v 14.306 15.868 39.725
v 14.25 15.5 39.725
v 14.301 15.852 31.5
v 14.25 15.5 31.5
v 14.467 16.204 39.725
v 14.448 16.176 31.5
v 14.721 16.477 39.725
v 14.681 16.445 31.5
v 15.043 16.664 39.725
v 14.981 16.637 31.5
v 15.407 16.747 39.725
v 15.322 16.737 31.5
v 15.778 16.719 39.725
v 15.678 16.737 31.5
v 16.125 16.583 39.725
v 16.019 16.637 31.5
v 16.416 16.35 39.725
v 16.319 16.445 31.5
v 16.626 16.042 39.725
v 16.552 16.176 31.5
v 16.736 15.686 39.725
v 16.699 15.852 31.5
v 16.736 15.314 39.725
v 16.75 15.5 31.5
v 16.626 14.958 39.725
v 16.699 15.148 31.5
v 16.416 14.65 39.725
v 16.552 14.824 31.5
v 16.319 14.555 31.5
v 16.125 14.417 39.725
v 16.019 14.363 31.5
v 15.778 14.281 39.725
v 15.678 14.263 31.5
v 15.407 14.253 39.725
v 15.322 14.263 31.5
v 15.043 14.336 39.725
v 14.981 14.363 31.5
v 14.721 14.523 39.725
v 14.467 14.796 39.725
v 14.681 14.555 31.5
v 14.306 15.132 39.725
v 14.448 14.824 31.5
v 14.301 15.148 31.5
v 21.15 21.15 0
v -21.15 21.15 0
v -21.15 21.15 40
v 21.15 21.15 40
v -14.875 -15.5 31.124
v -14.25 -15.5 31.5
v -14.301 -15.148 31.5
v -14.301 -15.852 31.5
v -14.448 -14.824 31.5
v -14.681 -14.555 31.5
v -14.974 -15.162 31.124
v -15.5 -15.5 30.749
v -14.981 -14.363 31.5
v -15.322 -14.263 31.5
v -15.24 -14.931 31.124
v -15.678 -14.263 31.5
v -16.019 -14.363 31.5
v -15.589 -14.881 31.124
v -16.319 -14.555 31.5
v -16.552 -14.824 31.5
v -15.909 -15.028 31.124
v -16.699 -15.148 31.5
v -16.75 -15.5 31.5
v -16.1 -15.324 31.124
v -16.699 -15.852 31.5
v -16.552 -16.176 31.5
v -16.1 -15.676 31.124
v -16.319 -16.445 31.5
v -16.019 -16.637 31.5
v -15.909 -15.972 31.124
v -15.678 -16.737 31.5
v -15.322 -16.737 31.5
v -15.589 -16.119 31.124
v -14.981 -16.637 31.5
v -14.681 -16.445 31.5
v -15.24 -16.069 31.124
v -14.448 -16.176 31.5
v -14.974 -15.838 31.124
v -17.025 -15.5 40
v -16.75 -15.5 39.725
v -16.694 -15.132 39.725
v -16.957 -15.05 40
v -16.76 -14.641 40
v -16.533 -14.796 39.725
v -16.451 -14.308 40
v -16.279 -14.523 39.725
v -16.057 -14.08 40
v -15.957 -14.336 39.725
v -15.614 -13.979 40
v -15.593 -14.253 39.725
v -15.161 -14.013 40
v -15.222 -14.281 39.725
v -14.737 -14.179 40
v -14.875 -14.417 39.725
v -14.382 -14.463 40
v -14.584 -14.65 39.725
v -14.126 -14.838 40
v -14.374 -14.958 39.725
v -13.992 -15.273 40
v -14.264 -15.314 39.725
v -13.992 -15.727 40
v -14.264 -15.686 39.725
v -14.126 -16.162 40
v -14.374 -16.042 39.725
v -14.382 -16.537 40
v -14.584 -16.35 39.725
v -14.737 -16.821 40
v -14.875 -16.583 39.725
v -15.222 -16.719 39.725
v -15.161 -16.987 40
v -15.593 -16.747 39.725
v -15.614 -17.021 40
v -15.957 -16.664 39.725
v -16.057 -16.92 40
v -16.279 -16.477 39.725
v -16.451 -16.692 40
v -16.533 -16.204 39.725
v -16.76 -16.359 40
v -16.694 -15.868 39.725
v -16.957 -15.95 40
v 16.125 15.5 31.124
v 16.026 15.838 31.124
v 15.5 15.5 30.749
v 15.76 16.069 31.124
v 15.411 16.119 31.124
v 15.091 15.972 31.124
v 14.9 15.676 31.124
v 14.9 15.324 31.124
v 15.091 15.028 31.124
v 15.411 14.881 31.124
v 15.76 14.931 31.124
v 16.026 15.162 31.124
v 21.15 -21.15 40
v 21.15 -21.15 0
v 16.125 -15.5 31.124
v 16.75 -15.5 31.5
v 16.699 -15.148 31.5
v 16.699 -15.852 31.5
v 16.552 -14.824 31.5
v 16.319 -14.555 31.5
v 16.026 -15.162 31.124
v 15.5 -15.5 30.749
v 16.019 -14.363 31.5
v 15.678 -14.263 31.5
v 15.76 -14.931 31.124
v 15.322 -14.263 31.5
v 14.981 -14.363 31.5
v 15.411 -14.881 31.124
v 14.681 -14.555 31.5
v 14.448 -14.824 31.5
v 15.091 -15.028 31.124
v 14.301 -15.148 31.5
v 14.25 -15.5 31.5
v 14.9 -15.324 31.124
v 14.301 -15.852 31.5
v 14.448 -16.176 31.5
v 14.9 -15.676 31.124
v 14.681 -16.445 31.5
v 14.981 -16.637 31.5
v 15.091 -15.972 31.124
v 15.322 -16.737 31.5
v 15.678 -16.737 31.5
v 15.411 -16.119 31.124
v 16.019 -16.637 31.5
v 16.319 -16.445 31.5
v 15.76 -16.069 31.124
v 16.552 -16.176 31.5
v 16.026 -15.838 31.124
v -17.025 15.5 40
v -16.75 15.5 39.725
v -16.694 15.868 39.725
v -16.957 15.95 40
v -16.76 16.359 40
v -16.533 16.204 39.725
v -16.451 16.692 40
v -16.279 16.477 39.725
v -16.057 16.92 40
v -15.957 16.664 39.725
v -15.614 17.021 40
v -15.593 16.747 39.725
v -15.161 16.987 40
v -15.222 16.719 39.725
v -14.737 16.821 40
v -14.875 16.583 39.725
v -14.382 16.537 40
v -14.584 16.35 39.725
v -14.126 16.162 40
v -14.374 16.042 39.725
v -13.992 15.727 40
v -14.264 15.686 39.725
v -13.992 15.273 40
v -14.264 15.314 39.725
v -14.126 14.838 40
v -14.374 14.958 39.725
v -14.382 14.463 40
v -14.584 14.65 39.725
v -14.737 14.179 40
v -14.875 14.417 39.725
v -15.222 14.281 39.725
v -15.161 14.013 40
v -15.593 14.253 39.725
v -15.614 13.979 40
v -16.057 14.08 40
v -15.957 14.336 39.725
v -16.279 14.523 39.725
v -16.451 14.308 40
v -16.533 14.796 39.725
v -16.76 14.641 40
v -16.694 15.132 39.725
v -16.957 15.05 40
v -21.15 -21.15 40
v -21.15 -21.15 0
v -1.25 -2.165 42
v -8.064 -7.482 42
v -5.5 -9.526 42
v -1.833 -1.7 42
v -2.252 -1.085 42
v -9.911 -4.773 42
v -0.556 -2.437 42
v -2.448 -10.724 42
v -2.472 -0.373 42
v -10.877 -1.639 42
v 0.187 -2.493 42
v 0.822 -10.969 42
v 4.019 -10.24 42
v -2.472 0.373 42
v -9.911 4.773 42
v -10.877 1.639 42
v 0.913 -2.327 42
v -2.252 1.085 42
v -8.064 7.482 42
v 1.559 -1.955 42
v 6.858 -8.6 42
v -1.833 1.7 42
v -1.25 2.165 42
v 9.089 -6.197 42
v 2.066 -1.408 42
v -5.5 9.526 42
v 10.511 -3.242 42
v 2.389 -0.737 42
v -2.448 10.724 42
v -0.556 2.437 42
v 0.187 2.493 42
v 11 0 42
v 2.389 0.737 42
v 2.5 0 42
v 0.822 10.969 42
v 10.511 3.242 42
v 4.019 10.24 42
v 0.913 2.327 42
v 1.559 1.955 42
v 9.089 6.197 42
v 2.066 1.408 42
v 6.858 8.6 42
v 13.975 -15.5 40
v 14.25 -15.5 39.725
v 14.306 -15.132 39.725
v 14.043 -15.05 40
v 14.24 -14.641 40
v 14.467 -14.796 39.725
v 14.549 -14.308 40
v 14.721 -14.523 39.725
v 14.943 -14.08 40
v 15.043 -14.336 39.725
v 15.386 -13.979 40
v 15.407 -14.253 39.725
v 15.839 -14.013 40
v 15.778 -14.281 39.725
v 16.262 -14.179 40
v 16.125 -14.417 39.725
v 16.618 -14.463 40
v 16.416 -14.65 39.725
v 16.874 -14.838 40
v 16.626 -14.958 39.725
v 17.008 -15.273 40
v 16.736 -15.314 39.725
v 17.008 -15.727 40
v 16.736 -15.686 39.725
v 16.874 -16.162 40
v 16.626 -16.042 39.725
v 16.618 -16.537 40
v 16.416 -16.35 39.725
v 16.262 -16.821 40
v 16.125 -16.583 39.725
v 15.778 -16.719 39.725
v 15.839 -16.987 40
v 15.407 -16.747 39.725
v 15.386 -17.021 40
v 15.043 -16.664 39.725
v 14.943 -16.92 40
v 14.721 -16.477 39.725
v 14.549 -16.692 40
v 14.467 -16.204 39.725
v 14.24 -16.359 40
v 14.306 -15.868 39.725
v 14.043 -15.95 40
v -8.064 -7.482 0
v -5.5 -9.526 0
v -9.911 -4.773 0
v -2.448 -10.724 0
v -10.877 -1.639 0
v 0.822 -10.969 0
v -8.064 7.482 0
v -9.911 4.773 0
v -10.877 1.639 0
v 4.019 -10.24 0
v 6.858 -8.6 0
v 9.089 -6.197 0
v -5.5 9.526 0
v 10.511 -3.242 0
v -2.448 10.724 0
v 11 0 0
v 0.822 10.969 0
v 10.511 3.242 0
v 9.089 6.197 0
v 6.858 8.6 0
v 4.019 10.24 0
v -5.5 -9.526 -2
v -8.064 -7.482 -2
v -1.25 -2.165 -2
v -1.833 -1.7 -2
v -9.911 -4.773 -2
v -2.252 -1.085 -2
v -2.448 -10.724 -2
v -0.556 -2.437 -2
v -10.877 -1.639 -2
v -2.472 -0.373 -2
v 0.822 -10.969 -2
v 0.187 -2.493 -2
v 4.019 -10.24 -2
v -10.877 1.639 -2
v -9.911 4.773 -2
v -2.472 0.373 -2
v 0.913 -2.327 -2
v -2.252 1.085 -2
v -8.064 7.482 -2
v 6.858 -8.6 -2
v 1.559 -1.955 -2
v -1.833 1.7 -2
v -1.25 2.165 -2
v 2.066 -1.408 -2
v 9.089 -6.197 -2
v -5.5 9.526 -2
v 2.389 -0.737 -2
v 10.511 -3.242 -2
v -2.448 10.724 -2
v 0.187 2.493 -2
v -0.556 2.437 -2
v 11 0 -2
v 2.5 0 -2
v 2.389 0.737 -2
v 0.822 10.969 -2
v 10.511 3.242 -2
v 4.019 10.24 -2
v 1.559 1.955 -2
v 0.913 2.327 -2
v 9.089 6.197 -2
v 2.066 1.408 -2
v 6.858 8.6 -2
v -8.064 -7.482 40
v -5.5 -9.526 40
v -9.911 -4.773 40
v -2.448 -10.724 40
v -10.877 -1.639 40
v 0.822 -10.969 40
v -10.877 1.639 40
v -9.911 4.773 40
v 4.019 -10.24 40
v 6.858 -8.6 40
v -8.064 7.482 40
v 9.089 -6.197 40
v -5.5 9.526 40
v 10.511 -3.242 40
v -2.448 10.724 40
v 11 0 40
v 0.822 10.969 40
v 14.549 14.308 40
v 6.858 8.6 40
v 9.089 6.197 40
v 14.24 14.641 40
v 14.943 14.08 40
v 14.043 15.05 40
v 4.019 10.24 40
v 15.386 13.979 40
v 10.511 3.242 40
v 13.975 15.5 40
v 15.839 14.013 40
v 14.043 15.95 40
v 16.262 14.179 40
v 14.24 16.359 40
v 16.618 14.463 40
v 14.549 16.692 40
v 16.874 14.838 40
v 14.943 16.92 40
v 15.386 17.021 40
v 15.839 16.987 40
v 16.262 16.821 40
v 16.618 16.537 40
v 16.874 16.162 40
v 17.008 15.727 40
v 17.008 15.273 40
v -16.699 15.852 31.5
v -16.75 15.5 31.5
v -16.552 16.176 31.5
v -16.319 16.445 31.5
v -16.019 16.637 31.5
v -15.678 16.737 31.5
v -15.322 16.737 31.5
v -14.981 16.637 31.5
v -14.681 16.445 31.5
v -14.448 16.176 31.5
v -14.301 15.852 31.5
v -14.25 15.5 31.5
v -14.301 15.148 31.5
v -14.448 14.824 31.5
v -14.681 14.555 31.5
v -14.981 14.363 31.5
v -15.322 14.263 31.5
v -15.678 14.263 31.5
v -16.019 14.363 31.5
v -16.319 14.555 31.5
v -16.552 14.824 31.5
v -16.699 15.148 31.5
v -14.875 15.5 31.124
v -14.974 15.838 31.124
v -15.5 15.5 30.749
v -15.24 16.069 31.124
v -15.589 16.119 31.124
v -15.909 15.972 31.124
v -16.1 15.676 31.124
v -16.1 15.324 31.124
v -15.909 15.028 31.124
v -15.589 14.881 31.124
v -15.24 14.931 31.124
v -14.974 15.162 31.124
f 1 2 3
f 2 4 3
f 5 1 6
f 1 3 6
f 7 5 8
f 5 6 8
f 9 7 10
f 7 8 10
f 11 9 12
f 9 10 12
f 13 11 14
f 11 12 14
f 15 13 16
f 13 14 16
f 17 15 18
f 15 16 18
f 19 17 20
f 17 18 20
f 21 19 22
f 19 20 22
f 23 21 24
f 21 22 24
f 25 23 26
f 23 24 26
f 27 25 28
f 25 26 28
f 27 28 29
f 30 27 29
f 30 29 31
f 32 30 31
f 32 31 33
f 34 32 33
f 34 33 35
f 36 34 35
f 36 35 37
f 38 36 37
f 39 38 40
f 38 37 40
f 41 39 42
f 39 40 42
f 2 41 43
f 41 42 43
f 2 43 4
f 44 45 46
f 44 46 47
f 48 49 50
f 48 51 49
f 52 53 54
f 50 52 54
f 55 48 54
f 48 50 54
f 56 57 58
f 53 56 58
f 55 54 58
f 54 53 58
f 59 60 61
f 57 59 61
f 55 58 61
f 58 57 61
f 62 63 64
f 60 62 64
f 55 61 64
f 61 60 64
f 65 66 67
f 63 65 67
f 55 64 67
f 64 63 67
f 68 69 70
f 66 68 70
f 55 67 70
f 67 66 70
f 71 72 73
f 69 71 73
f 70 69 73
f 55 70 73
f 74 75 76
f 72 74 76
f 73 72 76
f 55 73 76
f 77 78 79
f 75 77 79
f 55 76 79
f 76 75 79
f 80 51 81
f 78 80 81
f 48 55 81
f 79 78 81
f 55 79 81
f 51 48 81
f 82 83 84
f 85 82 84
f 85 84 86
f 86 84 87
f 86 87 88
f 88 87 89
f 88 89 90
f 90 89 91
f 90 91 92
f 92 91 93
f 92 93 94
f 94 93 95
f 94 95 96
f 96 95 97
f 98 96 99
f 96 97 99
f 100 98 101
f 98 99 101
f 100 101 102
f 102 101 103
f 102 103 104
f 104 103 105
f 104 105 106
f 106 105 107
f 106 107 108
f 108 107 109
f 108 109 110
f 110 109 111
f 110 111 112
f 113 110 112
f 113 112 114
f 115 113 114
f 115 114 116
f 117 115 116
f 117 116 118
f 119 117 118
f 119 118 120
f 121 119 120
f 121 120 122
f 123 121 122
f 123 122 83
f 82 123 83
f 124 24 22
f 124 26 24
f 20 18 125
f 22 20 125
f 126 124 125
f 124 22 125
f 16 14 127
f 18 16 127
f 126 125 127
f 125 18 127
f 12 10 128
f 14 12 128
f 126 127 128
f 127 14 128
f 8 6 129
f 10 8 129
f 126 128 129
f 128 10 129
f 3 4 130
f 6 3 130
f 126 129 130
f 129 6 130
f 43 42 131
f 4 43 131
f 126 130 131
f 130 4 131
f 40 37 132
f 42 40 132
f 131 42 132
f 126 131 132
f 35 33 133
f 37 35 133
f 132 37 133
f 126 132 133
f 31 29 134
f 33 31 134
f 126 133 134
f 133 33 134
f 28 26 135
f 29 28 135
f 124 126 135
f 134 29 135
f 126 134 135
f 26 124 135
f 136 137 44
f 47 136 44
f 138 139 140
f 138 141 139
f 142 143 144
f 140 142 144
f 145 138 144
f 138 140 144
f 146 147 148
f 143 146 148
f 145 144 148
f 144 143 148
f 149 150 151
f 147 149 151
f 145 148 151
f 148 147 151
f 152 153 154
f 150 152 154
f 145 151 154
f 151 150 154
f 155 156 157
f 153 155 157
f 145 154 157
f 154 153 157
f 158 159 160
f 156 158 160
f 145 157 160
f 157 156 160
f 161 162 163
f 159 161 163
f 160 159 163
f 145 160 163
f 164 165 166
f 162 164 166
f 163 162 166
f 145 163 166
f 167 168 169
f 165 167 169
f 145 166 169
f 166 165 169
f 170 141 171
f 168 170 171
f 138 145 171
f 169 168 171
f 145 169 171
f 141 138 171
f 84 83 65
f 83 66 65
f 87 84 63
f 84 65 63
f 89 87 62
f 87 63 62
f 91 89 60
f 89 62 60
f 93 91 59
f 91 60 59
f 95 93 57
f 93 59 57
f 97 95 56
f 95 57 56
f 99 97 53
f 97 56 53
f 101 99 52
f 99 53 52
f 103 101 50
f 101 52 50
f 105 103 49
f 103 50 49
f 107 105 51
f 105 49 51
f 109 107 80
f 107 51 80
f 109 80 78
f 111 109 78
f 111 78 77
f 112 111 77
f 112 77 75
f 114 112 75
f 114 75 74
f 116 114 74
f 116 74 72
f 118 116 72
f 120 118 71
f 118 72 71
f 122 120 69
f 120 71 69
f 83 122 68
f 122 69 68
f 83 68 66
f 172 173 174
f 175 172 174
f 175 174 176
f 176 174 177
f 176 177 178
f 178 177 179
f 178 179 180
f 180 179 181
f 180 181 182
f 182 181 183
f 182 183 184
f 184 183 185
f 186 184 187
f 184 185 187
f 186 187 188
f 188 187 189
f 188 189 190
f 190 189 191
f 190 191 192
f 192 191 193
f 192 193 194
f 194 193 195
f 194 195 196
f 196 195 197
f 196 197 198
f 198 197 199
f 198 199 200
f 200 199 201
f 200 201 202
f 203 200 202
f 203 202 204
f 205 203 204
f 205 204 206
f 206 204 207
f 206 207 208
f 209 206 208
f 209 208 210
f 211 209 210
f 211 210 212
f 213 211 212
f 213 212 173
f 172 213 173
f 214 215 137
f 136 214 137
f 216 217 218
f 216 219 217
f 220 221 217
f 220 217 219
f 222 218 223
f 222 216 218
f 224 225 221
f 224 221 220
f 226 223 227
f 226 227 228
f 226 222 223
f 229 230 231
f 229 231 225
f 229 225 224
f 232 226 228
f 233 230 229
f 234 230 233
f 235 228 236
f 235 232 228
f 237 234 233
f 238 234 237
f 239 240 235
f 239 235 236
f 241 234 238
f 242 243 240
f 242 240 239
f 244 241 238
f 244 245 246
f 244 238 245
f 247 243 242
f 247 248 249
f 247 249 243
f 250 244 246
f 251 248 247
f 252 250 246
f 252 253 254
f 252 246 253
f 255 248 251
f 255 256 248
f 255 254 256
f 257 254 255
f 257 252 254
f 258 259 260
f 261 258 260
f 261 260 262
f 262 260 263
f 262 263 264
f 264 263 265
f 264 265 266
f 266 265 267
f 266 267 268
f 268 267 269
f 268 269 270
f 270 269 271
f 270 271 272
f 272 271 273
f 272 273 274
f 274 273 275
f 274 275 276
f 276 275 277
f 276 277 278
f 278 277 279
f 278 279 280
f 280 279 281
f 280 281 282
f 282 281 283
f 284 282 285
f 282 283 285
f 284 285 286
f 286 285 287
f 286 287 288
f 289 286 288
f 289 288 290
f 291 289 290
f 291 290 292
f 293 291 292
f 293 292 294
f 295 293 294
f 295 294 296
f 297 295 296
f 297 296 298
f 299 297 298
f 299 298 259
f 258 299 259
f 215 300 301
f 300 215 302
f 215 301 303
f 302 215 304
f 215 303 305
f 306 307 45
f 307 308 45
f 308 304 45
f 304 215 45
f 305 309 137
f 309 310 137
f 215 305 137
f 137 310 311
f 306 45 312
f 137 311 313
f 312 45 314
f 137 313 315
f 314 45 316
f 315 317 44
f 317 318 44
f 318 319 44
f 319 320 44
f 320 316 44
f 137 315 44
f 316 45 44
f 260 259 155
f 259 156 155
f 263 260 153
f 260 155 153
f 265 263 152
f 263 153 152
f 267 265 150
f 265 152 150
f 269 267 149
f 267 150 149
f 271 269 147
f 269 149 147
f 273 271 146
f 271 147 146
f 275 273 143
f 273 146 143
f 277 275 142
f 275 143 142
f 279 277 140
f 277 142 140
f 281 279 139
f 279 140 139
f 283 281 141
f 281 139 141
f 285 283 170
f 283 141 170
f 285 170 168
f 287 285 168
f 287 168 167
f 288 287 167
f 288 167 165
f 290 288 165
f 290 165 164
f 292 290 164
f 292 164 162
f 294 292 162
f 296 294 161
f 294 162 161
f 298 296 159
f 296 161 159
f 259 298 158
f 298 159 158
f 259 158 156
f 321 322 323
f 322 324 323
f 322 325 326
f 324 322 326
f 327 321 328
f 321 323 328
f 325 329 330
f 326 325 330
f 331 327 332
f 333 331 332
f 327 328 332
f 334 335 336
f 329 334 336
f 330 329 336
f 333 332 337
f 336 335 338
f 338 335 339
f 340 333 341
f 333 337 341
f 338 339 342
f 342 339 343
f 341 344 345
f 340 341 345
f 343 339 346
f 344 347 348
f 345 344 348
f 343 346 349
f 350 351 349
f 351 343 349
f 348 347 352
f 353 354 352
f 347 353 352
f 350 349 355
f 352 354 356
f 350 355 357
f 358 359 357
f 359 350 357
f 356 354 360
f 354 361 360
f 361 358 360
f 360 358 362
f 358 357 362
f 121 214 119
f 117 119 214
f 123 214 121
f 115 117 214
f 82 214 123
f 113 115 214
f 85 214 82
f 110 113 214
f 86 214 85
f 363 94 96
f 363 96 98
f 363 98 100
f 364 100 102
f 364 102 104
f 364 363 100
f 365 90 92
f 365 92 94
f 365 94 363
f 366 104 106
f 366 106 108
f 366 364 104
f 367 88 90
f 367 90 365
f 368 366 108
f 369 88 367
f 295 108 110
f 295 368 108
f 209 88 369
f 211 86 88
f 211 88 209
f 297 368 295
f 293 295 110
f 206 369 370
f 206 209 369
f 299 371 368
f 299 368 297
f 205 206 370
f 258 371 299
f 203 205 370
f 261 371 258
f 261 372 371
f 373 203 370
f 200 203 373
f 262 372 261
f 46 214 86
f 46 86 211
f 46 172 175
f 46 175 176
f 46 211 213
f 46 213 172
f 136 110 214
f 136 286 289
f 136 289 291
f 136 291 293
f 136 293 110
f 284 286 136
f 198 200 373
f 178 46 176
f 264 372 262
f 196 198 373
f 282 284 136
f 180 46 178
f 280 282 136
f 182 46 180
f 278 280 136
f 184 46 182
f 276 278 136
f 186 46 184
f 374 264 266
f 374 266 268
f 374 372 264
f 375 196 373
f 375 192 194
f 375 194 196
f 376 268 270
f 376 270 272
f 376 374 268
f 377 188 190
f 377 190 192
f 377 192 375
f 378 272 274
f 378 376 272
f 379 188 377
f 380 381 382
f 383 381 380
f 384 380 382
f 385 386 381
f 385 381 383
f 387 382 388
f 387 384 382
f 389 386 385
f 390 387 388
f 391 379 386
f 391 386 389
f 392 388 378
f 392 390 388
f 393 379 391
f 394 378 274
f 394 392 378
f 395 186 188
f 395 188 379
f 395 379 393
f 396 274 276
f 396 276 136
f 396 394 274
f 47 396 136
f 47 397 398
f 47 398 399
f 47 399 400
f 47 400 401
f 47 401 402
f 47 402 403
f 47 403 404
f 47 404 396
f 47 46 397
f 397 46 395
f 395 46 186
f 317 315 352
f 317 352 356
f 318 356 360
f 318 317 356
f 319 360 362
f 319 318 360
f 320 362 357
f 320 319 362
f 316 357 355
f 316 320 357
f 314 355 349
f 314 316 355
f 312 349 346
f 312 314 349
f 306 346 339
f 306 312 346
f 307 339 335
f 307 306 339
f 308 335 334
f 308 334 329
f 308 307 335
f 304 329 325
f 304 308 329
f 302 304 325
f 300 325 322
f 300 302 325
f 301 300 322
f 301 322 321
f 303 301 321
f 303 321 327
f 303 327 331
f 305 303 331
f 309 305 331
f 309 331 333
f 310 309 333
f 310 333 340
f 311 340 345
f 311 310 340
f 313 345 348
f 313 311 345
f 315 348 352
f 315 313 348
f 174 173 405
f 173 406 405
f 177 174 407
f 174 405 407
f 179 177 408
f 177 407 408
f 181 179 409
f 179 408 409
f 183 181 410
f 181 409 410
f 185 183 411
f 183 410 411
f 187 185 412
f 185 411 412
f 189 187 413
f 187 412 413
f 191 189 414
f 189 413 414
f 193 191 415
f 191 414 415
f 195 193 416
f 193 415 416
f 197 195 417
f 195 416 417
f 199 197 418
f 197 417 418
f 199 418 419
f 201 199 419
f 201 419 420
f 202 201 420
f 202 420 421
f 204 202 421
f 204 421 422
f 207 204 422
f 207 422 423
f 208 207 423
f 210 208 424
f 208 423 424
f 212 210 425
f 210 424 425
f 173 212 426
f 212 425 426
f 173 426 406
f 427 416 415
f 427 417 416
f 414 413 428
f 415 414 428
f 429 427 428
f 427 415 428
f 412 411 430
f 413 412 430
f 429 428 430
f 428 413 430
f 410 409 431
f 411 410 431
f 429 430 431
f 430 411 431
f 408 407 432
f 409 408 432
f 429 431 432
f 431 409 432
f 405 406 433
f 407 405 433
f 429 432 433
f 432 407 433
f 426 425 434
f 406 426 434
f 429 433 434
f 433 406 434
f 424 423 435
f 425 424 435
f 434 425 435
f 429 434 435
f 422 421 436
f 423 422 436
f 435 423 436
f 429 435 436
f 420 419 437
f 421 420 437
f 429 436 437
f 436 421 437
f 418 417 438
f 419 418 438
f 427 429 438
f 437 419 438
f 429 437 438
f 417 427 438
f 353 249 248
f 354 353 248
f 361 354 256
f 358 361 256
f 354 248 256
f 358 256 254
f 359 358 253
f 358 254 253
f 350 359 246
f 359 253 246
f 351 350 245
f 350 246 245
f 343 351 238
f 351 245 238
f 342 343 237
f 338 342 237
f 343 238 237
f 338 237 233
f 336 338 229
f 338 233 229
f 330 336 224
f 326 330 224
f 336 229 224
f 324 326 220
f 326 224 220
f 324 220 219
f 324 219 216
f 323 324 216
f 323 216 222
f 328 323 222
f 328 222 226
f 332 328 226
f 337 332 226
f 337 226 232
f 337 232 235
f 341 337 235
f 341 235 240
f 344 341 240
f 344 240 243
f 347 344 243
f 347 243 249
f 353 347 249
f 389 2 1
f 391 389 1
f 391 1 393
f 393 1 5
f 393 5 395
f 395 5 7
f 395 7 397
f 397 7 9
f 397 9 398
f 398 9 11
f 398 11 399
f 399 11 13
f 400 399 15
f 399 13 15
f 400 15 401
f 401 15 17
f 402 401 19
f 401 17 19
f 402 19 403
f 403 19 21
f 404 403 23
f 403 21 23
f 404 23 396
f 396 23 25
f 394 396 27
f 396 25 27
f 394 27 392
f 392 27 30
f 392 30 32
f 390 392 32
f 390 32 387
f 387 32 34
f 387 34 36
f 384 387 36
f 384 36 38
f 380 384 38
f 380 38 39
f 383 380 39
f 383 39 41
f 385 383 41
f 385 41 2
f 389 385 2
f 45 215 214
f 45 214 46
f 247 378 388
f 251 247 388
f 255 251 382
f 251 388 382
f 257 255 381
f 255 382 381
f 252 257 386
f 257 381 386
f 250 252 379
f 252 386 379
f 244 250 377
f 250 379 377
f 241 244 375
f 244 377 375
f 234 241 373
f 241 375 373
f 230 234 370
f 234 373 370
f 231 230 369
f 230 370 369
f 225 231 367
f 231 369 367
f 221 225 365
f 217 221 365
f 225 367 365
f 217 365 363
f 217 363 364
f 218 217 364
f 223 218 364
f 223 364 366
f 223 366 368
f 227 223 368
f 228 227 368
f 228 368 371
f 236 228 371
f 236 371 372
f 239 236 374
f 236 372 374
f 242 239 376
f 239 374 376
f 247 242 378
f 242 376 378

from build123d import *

# Parameters (mm, degrees)
SKETCH_1_W                   = 42.3
SKETCH_1_H                   = 42.3
EXTRUDE_1_DEPTH              = 40
HOLE_WIZARD_M3_1_D           = 2.5
HOLE_WIZARD_M3_1_DEPTH       = 8.5
HOLE_WIZARD_M3_1_CSINK_D     = 3.05
HOLE_WIZARD_M3_1_CSINK_ANGLE = 90
HOLE_WIZARD_M3_1_TIP         = 0.751075774
SKETCH_6_R                   = 11
EXTRUDE_2_DEPTH              = 2
SKETCH_7_R                   = 2.5
CUT_EXTRUDE_1_DEPTH          = 54.203806255


with BuildPart() as part:
    # 스케치1 → 보스-돌출1 (new body)
    with BuildSketch(Plane.XY):
        Rectangle(SKETCH_1_W, SKETCH_1_H)
    extrude(amount=EXTRUDE_1_DEPTH)

    # M3 나사 구멍1
    with Locations(Plane.XY.offset(40)):
        with Locations((-15.5, 15.5), (15.5, 15.5), (15.5, -15.5), (-15.5, -15.5)):
            CounterSinkHole(HOLE_WIZARD_M3_1_D / 2, HOLE_WIZARD_M3_1_CSINK_D / 2, depth=HOLE_WIZARD_M3_1_DEPTH, counter_sink_angle=HOLE_WIZARD_M3_1_CSINK_ANGLE)
            with Locations((0, 0, -(HOLE_WIZARD_M3_1_DEPTH + HOLE_WIZARD_M3_1_TIP / 2))):  # 118° drill point
                Cone(0, HOLE_WIZARD_M3_1_D / 2, HOLE_WIZARD_M3_1_TIP, mode=Mode.SUBTRACT)

    # 스케치6 → 보스-돌출2 (add)
    with BuildSketch(Plane.XY.offset(40)):
        Circle(SKETCH_6_R)
    extrude_2 = extrude(amount=EXTRUDE_2_DEPTH)

    # 대칭 복사1: 보스-돌출2 across plane
    add(extrude_2.mirror(Plane(origin=(0, 0, 20), x_dir=(1, 0, 0), z_dir=(0, 0, -1))))

    # 스케치7 → 컷-돌출1 (cut, through all)
    with BuildSketch(Plane.XY.offset(42)):
        Circle(SKETCH_7_R)
    extrude(amount=-CUT_EXTRUDE_1_DEPTH, mode=Mode.SUBTRACT)


solid = part.part
